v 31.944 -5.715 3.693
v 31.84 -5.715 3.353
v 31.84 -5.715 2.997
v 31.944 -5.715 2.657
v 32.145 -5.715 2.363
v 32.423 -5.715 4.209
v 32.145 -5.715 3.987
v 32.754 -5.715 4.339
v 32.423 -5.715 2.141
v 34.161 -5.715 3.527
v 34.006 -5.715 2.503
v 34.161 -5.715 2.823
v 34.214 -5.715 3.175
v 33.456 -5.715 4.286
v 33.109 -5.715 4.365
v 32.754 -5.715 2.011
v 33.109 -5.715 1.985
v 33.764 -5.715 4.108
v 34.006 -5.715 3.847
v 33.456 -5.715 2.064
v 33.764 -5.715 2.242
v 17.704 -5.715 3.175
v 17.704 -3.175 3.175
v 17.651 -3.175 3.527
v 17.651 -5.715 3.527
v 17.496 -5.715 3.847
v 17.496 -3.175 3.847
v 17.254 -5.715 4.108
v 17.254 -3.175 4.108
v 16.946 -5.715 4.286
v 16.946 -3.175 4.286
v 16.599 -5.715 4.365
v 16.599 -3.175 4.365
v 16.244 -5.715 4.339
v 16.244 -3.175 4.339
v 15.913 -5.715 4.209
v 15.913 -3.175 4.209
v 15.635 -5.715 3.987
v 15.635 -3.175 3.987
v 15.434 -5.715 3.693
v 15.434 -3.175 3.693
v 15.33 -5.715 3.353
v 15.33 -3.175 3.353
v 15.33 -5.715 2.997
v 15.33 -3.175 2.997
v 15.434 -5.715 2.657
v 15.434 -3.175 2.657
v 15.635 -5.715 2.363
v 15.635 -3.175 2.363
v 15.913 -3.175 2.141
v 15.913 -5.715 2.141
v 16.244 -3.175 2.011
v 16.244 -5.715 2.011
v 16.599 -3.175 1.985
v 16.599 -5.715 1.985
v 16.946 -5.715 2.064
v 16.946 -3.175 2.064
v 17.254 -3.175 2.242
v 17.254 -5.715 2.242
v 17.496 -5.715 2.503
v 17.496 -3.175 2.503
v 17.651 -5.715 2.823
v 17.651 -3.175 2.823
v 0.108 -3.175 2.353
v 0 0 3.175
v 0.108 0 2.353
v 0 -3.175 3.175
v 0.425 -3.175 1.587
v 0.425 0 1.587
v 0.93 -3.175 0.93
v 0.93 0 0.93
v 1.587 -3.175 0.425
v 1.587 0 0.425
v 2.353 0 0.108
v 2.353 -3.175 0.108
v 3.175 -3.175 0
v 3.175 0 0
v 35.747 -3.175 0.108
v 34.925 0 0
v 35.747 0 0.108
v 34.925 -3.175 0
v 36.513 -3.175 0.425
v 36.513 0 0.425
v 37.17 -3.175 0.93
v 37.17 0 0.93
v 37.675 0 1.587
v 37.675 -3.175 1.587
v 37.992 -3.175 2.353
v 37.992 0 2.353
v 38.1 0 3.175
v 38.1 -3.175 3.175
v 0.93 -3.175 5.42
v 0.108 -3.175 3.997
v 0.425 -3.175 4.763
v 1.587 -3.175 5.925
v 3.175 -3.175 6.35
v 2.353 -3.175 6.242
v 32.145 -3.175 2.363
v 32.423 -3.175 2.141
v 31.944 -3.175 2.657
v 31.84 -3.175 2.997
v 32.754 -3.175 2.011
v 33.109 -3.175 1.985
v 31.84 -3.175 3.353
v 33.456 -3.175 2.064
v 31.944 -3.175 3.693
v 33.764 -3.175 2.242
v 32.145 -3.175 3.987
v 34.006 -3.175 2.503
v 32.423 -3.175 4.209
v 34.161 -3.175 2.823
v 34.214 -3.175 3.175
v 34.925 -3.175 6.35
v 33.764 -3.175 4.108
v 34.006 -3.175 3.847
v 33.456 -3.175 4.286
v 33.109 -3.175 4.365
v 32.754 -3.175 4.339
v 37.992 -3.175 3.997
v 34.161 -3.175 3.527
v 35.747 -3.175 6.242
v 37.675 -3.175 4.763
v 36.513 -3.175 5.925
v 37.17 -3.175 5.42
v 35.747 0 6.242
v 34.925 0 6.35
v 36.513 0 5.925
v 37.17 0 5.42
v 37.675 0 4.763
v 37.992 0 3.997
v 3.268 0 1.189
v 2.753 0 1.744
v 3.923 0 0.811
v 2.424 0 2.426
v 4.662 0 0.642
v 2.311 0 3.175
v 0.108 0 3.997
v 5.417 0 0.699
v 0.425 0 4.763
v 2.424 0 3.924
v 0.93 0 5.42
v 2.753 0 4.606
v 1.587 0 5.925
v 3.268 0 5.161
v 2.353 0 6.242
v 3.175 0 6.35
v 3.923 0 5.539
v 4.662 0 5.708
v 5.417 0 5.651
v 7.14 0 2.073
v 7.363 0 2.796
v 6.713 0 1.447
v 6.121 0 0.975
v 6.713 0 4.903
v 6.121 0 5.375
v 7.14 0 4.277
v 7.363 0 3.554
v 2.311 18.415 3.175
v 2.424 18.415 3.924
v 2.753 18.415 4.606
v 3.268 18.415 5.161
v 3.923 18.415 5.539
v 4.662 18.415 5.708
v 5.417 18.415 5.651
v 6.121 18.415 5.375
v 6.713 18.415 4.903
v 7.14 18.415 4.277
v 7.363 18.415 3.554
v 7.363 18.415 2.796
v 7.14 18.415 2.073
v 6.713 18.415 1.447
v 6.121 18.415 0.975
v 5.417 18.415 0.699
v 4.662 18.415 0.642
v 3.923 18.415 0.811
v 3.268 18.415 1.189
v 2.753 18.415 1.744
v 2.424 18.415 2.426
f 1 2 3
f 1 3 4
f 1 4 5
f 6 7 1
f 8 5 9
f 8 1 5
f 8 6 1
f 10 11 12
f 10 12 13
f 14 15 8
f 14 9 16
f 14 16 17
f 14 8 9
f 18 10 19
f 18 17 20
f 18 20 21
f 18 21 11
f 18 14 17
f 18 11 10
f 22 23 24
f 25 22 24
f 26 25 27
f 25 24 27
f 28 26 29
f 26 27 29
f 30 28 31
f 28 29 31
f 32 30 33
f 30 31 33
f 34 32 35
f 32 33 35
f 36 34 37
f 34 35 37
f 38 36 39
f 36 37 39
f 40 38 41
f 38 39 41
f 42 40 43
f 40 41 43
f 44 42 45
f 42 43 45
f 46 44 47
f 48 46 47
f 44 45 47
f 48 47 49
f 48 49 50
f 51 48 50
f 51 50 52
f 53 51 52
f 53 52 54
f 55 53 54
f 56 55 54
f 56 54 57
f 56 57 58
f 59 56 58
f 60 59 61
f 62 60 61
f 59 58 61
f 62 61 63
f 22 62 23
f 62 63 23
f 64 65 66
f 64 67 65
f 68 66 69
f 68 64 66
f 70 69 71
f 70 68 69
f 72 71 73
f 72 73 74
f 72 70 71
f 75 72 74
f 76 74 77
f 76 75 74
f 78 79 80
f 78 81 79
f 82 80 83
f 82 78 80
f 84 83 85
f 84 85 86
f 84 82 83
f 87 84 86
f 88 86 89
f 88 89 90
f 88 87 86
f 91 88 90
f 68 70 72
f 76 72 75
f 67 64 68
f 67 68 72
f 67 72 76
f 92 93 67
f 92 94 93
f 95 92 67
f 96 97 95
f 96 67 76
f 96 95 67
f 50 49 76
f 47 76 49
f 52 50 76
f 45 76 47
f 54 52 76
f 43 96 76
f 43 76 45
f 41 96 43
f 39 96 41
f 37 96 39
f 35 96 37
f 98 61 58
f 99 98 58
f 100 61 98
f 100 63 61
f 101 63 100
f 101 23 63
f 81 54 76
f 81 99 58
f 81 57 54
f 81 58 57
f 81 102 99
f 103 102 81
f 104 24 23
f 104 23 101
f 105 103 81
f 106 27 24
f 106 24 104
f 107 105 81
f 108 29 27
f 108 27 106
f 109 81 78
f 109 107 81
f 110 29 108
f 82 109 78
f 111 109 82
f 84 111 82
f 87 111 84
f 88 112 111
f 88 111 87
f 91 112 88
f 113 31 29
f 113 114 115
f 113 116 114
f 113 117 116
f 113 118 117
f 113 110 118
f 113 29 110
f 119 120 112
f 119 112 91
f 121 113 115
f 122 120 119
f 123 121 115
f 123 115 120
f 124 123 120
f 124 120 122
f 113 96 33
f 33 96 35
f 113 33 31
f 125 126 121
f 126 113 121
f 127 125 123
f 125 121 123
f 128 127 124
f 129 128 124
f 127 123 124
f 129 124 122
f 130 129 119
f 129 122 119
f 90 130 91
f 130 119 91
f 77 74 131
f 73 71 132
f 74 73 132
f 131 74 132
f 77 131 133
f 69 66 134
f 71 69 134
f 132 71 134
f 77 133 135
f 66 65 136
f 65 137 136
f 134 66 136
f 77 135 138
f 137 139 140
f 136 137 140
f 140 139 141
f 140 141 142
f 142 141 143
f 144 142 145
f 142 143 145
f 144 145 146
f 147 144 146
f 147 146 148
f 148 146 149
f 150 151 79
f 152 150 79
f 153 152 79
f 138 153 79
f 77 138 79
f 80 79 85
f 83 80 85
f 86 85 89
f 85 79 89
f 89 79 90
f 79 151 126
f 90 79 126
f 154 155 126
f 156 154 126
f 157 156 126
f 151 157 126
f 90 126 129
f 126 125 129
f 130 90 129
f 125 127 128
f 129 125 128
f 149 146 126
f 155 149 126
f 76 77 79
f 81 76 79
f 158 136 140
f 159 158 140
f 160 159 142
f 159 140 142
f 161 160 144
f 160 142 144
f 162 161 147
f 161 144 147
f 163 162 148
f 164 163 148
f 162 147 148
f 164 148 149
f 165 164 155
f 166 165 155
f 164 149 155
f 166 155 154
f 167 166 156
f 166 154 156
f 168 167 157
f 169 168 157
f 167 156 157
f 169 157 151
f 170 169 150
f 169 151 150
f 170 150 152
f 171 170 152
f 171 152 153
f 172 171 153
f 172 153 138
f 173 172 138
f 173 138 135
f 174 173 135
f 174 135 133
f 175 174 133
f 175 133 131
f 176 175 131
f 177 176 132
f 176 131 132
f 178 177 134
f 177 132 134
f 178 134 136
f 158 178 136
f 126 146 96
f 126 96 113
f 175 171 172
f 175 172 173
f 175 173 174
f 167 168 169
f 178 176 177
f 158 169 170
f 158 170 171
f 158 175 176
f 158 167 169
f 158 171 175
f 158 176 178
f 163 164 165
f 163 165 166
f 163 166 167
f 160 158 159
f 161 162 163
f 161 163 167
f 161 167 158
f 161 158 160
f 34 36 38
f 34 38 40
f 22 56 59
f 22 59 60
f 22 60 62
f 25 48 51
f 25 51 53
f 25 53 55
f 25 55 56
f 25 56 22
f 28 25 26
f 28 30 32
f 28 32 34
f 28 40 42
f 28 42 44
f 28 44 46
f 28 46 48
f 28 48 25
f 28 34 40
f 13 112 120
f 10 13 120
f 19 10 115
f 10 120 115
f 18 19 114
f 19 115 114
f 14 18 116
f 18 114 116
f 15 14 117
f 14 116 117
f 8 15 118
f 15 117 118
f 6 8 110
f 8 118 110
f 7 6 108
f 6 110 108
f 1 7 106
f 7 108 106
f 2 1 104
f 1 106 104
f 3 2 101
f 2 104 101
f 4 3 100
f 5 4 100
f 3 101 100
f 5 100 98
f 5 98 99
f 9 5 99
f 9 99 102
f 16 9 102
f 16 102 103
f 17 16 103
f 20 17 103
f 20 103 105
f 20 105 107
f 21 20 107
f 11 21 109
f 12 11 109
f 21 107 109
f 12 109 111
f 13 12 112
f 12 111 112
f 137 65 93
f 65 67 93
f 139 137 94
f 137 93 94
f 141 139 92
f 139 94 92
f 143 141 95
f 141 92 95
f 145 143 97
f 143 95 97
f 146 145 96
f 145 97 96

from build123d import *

# Parameters (mm, degrees)
F0_W     = 38.1
F0_H     = 6.35
F1_DEPTH = 3.175
F2_R     = 1.1938
F3_DEPTH = 2.54
F4_R     = 2.54
F5_DEPTH = 18.415
F6_R     = 3.17499


# Not quite as in the source:
# - a fillet or chamfer is up to 0.001 mm smaller than in the source, because OpenCascade refuses the exact size


with BuildPart() as f1:
    # F0 (on Front) → F1 (new body)
    with BuildSketch(Plane.XZ):
        with Locations((19.05, 3.175)):
            Rectangle(F0_W, F0_H)
    extrude(amount=F1_DEPTH)

    # F2 (on face) → F3 (join)
    with BuildSketch(Plane.XZ.offset(3.175)):
        with Locations((16.51, 3.175)):
            Circle(F2_R)
        with Locations((33.02, 3.175)):
            Circle(F2_R)
    extrude(amount=F3_DEPTH)

    # F4 (on face) → F5 (join)
    with BuildSketch(Plane(origin=(0, 0, 0), x_dir=(-1, 0, 0), z_dir=(0, 1, 0))):
        with Locations((-4.8514, 3.175)):
            Circle(F4_R)
    extrude(amount=F5_DEPTH)

    # F6 (radius 3.175 in the source; OpenCascade refuses exactly that, so slightly less here)
    f6_edges = [f1.edges().sort_by_distance(p)[0] for p in [
        (38.1, -1.5875, 6.35),
        (38.1, -1.5875, 0),
        (0, -1.5875, 6.35),
        (0, -1.5875, 0),
    ]]
    fillet(f6_edges, radius=F6_R)


solid = f1.part
